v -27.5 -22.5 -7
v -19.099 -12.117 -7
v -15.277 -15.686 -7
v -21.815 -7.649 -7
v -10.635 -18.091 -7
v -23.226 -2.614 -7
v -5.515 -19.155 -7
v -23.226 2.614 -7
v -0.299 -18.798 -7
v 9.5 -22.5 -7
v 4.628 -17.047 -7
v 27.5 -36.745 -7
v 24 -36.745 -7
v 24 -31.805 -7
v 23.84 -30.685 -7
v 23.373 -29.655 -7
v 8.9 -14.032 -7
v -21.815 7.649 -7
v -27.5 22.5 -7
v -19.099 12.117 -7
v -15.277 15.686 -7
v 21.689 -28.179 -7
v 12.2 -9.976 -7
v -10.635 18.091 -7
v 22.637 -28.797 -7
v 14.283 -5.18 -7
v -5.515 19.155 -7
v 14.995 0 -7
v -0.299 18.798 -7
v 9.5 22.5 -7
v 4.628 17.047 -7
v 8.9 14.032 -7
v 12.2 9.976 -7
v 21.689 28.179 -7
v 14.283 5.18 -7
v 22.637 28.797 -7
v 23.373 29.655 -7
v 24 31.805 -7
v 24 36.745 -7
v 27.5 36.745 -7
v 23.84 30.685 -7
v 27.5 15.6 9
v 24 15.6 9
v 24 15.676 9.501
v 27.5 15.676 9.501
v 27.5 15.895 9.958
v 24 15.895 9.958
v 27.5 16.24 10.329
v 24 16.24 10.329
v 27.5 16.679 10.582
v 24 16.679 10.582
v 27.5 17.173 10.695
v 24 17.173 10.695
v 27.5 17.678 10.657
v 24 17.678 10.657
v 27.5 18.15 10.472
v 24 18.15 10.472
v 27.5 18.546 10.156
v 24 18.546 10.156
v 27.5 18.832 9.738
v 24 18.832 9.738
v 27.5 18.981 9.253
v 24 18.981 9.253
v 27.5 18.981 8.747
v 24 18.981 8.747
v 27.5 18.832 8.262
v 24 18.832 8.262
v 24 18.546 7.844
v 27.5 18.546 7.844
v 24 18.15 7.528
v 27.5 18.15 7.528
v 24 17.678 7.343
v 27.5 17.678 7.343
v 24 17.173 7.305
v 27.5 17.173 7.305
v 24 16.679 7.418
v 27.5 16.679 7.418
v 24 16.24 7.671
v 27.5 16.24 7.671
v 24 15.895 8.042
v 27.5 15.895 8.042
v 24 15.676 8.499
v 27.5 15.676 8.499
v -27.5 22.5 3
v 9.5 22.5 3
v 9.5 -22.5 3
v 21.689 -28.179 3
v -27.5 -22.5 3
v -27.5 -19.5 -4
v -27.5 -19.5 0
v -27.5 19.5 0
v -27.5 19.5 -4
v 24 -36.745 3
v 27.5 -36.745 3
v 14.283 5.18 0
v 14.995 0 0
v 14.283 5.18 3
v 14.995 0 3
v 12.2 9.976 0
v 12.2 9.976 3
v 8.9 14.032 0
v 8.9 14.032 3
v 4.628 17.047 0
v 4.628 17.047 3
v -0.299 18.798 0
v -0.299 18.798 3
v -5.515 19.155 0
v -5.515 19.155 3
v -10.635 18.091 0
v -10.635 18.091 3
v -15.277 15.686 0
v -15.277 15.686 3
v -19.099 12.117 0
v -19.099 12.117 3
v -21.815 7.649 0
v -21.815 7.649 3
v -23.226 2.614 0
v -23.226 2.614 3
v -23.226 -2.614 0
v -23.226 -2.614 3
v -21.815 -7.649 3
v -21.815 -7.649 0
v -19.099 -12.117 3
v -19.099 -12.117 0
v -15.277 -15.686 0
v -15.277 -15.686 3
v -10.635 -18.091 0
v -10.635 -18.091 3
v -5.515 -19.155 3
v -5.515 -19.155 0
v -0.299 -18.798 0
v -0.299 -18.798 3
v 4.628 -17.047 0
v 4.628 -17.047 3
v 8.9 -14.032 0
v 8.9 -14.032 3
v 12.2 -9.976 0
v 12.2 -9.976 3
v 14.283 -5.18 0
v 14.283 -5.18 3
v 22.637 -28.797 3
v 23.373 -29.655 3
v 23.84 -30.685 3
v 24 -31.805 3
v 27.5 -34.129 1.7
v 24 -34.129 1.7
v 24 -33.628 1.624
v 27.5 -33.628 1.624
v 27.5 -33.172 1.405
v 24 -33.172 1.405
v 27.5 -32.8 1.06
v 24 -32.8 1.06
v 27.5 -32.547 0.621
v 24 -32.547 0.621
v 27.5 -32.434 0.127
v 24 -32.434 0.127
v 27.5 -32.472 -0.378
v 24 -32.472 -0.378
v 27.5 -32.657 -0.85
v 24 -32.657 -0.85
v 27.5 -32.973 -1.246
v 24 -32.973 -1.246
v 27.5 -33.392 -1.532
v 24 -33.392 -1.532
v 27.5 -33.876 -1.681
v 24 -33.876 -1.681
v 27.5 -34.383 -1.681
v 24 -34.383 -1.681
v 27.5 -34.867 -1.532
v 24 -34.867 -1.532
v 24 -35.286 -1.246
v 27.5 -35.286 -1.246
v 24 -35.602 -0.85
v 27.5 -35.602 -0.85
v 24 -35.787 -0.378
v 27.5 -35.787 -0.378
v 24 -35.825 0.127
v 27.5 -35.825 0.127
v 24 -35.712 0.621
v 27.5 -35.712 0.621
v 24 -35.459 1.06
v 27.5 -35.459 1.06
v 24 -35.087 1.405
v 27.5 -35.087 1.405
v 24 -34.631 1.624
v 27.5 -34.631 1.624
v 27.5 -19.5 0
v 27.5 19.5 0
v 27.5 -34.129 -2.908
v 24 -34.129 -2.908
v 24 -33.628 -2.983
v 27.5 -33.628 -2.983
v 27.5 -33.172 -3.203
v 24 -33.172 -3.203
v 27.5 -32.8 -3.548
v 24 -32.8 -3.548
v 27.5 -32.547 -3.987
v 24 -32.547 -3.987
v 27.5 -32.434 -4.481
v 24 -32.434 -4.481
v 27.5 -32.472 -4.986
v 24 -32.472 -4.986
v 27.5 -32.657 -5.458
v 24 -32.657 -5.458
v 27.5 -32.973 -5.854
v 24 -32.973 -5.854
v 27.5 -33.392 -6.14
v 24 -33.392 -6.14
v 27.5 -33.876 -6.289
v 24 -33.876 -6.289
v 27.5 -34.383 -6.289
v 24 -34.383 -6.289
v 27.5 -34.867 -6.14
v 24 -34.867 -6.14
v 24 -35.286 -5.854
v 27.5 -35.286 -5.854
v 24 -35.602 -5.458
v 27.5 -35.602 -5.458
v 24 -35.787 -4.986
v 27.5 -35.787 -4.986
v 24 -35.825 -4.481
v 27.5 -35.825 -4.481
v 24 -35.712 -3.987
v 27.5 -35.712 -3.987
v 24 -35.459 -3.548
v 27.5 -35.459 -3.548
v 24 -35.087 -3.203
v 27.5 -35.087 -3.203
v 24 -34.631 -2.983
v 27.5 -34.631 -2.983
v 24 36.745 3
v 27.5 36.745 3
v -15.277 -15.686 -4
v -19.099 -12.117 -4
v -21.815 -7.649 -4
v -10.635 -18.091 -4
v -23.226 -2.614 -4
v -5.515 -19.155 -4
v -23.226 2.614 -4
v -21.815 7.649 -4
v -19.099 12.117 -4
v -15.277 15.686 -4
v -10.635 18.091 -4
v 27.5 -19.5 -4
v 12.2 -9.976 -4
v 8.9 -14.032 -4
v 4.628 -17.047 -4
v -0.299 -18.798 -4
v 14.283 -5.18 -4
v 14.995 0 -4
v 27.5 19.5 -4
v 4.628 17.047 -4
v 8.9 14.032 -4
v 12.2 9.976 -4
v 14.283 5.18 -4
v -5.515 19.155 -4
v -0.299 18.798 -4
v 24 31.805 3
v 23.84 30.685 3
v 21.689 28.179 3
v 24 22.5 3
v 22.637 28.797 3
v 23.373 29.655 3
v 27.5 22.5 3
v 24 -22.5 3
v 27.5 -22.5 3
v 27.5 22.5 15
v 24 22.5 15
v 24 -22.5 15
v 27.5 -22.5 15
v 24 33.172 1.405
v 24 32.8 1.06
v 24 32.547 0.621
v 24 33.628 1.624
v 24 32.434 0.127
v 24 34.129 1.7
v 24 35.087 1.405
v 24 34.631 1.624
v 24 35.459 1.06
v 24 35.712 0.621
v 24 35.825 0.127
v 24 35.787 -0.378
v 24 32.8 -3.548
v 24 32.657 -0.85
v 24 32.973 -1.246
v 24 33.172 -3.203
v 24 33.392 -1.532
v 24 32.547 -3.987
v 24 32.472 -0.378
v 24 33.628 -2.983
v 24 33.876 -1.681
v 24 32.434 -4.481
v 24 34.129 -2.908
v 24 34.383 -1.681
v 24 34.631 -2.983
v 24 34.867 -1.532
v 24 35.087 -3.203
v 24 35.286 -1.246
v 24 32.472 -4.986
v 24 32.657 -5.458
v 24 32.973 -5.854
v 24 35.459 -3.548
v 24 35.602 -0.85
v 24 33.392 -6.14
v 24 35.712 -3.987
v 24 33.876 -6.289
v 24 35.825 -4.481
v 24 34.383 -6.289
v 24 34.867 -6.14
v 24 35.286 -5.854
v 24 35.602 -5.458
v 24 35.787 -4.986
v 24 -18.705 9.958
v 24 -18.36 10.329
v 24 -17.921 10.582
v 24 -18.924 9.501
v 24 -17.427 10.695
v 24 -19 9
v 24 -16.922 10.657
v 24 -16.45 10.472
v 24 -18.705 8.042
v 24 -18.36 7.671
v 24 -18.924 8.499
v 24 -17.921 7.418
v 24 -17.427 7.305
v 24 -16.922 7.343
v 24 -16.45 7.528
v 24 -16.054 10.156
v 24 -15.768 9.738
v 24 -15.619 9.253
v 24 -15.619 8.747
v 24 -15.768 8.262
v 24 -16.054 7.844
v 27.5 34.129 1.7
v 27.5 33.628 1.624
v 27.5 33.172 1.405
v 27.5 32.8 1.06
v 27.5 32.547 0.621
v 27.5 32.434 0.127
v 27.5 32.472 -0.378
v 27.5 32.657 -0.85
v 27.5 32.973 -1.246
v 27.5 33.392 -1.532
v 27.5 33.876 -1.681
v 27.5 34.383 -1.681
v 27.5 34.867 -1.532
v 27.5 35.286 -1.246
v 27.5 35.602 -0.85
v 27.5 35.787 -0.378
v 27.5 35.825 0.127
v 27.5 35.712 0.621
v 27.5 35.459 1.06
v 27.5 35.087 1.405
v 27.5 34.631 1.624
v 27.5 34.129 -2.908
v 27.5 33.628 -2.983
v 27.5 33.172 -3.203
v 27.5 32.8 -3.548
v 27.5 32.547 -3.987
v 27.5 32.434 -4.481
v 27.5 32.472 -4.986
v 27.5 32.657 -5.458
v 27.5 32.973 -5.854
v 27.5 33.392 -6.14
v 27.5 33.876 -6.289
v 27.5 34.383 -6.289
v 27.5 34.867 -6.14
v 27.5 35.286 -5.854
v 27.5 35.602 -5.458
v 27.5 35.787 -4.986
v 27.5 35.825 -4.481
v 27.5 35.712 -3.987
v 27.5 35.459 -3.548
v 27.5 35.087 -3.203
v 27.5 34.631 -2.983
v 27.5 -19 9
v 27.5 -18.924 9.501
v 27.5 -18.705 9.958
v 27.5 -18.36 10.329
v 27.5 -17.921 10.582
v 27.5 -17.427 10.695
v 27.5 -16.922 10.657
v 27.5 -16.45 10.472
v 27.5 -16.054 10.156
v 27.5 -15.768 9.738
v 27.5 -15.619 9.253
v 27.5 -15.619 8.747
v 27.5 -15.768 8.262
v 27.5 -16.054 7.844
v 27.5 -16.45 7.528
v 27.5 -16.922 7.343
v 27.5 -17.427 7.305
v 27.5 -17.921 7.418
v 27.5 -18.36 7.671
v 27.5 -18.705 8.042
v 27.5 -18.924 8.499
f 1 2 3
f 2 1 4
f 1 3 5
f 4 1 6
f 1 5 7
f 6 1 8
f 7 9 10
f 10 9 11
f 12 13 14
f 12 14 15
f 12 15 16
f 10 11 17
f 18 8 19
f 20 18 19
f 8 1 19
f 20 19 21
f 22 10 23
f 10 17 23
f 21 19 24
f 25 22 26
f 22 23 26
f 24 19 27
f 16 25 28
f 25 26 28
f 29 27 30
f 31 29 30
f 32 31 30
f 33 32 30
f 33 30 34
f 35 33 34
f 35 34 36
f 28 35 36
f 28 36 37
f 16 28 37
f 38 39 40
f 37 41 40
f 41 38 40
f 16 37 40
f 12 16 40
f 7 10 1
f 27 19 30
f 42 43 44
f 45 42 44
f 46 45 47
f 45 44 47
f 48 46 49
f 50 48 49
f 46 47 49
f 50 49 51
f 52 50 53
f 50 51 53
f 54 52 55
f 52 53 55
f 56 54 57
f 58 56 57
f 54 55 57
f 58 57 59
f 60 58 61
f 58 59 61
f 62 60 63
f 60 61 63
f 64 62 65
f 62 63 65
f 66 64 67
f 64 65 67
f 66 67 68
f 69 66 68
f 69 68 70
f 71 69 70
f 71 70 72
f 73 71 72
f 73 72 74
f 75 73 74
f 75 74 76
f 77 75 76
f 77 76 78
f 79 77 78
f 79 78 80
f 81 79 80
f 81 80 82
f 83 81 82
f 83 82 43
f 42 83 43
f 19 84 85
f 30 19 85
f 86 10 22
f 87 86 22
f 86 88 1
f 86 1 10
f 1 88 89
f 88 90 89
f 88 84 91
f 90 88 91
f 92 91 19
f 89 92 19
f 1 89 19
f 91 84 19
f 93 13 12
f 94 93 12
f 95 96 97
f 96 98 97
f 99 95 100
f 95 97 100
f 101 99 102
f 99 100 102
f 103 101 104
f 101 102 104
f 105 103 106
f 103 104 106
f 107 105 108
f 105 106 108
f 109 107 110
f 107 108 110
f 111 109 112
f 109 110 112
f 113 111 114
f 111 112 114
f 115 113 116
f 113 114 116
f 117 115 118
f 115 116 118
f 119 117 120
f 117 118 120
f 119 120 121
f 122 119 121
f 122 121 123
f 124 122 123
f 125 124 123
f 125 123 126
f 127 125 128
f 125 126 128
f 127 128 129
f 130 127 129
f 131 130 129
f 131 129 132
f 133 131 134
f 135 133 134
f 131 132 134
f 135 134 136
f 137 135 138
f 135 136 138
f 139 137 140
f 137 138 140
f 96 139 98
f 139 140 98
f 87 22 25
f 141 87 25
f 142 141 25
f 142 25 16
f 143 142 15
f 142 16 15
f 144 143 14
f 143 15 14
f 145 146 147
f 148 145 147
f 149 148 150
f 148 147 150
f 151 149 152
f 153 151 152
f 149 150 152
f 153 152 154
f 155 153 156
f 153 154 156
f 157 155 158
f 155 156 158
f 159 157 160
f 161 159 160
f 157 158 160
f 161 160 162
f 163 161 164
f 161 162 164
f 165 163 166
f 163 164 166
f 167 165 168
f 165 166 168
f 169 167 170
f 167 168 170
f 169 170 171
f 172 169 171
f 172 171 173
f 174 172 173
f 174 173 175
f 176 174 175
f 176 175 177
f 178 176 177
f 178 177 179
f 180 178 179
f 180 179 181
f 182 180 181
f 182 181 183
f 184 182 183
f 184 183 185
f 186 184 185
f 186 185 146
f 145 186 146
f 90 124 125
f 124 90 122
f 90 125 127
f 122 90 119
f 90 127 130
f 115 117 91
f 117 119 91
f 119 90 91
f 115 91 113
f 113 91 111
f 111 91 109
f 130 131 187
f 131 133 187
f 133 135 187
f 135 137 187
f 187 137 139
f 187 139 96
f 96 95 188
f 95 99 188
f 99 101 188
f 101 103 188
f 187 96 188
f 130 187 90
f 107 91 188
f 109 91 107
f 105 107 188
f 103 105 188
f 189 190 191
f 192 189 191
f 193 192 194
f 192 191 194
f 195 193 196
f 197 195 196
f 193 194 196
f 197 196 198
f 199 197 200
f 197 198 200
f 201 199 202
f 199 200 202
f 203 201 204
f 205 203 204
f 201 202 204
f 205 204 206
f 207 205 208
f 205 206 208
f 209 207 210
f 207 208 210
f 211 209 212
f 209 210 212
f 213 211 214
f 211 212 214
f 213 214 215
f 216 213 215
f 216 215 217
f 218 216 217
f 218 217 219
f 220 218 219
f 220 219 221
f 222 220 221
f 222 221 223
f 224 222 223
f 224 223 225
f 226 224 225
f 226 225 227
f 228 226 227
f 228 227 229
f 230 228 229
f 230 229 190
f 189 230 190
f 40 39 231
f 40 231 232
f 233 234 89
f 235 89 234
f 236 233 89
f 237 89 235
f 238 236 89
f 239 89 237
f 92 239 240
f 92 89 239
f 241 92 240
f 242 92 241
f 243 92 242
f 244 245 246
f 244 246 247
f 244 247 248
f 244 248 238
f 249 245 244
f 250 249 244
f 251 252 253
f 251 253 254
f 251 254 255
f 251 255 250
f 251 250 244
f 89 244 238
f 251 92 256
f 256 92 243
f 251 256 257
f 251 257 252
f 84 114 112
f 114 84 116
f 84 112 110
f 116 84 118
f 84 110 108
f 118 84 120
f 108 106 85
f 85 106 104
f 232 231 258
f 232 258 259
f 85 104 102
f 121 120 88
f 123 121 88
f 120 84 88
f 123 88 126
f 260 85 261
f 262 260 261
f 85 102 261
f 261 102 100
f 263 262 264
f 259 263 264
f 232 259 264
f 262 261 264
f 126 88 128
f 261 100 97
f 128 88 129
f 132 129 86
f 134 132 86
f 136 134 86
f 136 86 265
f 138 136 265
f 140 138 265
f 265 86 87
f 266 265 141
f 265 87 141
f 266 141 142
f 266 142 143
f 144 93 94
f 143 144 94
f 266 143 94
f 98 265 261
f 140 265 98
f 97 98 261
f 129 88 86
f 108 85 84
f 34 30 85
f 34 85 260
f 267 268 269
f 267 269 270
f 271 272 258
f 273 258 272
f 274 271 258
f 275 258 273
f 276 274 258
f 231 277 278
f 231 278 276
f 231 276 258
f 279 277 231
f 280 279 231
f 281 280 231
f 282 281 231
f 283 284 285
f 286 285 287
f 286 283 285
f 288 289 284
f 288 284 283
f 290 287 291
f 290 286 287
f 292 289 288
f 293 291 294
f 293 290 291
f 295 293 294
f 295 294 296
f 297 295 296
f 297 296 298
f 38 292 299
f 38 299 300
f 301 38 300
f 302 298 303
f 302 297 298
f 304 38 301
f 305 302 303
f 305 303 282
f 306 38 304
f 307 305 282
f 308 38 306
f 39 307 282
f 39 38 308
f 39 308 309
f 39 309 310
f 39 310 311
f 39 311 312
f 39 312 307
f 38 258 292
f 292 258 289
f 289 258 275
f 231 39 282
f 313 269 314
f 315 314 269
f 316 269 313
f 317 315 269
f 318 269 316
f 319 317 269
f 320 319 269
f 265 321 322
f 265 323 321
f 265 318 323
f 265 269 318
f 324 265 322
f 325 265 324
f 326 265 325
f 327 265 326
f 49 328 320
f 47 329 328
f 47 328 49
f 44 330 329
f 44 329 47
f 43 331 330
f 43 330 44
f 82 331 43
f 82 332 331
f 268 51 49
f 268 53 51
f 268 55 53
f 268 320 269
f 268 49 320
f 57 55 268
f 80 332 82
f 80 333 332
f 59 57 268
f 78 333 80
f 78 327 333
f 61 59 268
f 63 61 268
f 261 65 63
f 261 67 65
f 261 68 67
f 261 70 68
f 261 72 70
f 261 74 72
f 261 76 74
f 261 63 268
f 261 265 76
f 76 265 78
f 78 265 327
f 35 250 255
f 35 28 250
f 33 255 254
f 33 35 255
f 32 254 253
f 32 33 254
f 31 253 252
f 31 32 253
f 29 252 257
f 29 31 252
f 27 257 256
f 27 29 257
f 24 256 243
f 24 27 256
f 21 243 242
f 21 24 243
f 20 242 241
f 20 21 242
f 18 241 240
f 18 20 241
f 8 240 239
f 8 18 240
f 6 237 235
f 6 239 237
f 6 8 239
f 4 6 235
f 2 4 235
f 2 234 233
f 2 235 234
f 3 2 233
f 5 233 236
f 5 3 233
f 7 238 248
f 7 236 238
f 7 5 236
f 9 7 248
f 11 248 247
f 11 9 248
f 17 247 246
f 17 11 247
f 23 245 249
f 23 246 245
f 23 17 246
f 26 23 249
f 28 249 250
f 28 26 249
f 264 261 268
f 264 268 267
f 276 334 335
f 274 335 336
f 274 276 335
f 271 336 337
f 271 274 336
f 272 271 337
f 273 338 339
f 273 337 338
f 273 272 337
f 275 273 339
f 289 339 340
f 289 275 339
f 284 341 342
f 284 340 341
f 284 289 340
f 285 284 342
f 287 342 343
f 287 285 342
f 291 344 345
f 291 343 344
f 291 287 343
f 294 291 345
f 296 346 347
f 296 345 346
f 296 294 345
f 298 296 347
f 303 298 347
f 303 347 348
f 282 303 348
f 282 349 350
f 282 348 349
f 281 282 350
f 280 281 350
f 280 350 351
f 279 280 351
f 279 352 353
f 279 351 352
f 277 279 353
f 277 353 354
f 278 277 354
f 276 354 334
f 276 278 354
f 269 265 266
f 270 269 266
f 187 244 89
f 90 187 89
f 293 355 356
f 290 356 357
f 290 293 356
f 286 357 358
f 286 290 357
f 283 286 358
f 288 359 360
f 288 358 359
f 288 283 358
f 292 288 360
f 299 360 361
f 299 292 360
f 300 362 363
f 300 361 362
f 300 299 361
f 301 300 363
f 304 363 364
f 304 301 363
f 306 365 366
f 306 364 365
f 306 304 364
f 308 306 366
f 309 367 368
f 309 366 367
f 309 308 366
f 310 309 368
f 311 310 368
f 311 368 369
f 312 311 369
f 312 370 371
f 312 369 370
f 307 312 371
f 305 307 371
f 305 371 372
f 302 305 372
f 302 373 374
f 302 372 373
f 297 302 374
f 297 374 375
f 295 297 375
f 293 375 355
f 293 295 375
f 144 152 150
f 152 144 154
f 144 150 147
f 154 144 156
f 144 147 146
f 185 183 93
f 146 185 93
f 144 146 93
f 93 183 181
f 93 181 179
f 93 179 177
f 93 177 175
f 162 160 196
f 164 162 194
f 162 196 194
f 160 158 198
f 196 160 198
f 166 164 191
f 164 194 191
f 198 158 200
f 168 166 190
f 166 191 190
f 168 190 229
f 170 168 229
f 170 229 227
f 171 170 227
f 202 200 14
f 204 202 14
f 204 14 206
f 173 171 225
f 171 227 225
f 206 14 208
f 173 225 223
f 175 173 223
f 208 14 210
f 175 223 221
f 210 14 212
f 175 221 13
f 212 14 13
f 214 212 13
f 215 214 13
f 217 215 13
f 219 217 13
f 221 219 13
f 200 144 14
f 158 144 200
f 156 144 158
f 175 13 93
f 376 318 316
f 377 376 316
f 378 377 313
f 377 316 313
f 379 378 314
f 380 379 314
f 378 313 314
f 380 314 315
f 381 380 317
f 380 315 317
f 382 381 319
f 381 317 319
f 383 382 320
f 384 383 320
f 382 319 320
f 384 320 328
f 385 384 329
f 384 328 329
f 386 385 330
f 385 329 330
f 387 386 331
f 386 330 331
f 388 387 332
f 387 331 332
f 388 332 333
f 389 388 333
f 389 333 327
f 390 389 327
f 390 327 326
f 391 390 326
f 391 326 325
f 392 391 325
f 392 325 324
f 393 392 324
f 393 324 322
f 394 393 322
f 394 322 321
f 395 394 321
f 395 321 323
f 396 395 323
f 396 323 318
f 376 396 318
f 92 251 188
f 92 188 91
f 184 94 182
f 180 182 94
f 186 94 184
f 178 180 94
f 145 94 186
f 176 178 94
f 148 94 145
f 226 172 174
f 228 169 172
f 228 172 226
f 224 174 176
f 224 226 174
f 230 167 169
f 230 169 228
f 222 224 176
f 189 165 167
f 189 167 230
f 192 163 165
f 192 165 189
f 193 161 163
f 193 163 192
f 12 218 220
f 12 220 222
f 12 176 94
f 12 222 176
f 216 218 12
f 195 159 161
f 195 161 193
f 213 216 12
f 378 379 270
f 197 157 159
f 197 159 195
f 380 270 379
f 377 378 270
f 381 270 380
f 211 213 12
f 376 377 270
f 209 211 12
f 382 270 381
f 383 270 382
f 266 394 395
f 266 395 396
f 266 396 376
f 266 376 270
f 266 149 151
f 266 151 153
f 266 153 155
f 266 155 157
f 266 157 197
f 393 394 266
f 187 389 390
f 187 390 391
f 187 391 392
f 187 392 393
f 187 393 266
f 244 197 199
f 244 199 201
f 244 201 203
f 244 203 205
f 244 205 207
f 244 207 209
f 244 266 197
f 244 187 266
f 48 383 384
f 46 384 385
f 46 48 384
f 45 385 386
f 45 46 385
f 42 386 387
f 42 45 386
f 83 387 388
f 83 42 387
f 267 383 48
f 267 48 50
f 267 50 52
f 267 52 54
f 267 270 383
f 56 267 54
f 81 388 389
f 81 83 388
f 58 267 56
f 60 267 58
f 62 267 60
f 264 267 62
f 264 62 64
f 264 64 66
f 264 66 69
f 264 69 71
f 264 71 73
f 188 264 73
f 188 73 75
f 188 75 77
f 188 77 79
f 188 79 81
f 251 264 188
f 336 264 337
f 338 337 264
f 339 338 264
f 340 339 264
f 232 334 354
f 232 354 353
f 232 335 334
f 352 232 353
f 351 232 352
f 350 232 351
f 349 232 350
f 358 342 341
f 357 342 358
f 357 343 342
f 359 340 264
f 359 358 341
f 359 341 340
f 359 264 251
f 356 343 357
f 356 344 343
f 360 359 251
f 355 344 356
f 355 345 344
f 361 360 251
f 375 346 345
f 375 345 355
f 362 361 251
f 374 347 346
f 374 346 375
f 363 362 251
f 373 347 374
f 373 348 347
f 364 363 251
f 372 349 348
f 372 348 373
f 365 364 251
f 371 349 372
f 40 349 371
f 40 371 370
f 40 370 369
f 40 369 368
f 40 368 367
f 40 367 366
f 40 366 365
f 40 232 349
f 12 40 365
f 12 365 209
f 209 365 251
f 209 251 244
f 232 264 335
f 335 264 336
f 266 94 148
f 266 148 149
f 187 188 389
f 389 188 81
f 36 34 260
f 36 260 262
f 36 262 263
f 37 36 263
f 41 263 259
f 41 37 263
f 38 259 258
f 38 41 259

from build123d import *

# Parameters (mm, degrees)
SKETCH_1_W          = 55
SKETCH_1_H          = 45
EXTRUDE_1_DEPTH     = 3
SKETCH_2_W          = 3.5
SKETCH_2_H          = 45
EXTRUDE_2_DEPTH     = 12
SKETCH_3_R          = 1.7
CUT_EXTRUDE_1_DEPTH = 59.167860542
EXTRUDE_START       = -7
EXTRUDE_3_DEPTH     = 10
SKETCH_6_R          = 1.7
CUT_EXTRUDE_2_DEPTH = 66.018535195
SKETCH_7_R          = 19.2
CUT_EXTRUDE_3_DEPTH = 48.438485631
SKETCH_10_W         = 55
SKETCH_10_H         = 4
EXTRUDE_9_DEPTH     = 3


with BuildPart() as part:
    # 草图1 → 凸台-拉伸1 (new body)
    with BuildSketch(Plane.XY):
        Rectangle(SKETCH_1_W, SKETCH_1_H)
    extrude_1 = extrude(amount=EXTRUDE_1_DEPTH)

    # 草图2 → 凸台-拉伸2 (add)
    with BuildSketch(Plane.XY.offset(3)):
        with Locations((25.75, 0)):
            Rectangle(SKETCH_2_W, SKETCH_2_H)
    extrude(amount=EXTRUDE_2_DEPTH)

    # 草图3 → 切除-拉伸1 (cut, through all)
    with BuildSketch(Plane.ZY.offset(-24)):
        with Locations(Location((9, -17.3, 0), (0, 0, 270))):
            Circle(SKETCH_3_R)
        with Locations(Location((9, 17.3, 0), (0, 0, 270))):
            Circle(SKETCH_3_R)
    extrude(amount=-CUT_EXTRUDE_1_DEPTH, mode=Mode.SUBTRACT)

    # 草图5 → 凸台-拉伸3 (add)
    with BuildSketch(Plane.XY.offset(EXTRUDE_START)):
        with BuildLine():
            Line((27.5, -22.5), (9.5, -22.5))
            Line((9.5, -22.5), (21.689237996, -28.178880611))
            ThreePointArc((21.689237996, -28.178880611), (23.373199667, -29.654914404), (24, -31.804687417))
            Line((24, -31.804687417), (24, -36.744522299))
            Line((24, -36.744522299), (27.5, -36.744522299))
            Line((27.5, -36.744522299), (27.5, -22.5))
        make_face()
    extrude_3 = extrude(amount=EXTRUDE_3_DEPTH)

    # 草图6 → 切除-拉伸2 (cut, through all)
    with BuildSketch(Plane.ZY.offset(-24)):
        with Locations((0, -34.129434576)):
            Circle(SKETCH_6_R)
        with Locations((-4.607898424, -34.129434576)):
            Circle(SKETCH_6_R)
    cut_extrude_2 = extrude(amount=-CUT_EXTRUDE_2_DEPTH, mode=Mode.SUBTRACT)

    # 镜向3: 凸台-拉伸3, 切除-拉伸2 across plane
    add(extrude_3.mirror(Plane.ZX))
    add(cut_extrude_2.mirror(Plane.ZX), mode=Mode.SUBTRACT)

    # 草图7 → 切除-拉伸3 (cut, symmetric)
    with BuildSketch(Plane.XY.offset(3)):
        with Locations((-4.204977357, 0)):
            Circle(SKETCH_7_R)
    cut_extrude_3 = extrude(amount=CUT_EXTRUDE_3_DEPTH, both=True, mode=Mode.SUBTRACT)

    # 镜向6: 凸台-拉伸1, 切除-拉伸3 across plane
    add(extrude_1.mirror(Plane.XY.offset(-2)))
    add(cut_extrude_3.mirror(Plane.XY.offset(-2)), mode=Mode.SUBTRACT)

    # 草图10 → 凸台-拉伸9 (add)
    with BuildSketch(Plane(origin=(0, -22.5, 0), x_dir=(-1, 0, 0), z_dir=(0, -1, 0))):
        with Locations((0, 2)):
            Rectangle(SKETCH_10_W, SKETCH_10_H)
    extrude_9 = extrude(amount=-EXTRUDE_9_DEPTH)

    # 镜向7: 凸台-拉伸9 across plane
    add(extrude_9.mirror(Plane.ZX))


solid = part.part
